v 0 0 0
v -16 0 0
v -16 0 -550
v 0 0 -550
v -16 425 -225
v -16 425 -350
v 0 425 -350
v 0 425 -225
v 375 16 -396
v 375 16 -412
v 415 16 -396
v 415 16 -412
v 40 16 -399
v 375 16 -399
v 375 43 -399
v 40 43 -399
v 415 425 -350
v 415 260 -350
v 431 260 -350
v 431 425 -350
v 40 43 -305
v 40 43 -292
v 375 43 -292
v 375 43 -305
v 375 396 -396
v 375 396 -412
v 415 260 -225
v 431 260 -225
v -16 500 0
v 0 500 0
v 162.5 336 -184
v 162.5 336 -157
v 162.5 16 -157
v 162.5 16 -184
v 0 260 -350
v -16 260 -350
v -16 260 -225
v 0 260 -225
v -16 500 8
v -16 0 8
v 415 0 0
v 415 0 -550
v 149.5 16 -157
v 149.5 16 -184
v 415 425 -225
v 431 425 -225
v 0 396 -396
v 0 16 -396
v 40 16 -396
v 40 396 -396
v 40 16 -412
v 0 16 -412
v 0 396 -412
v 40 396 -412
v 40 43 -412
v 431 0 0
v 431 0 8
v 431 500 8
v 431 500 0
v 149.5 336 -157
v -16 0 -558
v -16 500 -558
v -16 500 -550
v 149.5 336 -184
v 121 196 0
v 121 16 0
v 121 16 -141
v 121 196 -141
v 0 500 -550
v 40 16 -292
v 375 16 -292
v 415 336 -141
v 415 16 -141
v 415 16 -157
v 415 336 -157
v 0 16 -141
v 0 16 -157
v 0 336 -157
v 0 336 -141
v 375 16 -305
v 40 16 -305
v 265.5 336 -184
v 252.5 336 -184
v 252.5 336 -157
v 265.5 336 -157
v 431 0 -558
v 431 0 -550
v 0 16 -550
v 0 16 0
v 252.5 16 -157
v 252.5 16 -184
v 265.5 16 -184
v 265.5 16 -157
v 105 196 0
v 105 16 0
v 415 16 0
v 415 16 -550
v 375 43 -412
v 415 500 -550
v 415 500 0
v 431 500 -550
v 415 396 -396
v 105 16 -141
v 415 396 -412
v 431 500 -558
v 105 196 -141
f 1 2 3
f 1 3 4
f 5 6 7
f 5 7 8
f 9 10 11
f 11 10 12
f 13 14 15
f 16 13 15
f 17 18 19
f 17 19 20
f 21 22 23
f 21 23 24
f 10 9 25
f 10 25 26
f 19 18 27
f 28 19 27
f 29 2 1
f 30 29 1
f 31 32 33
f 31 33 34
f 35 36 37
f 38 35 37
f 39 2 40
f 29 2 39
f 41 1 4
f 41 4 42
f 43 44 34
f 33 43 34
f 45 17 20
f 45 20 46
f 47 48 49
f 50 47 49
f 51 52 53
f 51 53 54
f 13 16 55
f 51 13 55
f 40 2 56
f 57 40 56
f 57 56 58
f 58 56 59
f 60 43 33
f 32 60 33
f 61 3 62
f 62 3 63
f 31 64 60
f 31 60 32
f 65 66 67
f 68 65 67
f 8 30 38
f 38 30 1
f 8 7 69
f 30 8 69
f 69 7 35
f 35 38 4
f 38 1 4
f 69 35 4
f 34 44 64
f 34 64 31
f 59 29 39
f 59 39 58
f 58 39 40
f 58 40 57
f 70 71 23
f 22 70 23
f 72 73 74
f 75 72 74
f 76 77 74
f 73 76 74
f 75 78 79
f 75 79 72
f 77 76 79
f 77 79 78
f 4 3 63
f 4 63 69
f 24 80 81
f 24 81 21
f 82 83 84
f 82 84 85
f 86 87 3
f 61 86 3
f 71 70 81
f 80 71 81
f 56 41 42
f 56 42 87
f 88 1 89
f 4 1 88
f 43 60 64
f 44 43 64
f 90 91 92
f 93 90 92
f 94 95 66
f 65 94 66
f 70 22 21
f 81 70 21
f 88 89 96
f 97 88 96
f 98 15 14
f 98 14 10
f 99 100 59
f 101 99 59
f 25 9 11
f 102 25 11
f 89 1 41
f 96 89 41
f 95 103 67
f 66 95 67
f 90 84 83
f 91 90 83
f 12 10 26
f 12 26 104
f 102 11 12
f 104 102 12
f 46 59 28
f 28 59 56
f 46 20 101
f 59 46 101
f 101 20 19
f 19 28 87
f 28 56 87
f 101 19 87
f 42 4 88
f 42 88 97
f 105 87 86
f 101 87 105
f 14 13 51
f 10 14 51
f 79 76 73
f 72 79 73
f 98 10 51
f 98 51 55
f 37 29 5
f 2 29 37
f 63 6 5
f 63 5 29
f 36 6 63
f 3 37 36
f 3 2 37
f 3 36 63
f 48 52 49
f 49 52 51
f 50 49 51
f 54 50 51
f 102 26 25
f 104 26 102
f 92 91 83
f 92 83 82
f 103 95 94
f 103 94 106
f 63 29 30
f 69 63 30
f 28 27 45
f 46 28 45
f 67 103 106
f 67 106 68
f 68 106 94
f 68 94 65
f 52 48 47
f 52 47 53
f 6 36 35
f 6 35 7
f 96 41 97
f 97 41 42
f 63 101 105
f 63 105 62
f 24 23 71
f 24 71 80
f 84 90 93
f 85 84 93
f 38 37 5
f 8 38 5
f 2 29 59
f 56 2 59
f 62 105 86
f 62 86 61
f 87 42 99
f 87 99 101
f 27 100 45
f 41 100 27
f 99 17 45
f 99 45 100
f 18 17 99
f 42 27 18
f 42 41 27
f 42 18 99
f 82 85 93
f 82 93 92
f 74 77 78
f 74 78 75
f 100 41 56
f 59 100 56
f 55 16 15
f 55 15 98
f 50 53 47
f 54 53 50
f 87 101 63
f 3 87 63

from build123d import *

# Parameters (mm, degrees)
ESQUISSE1_W             = 415
ESQUISSE1_H             = 550
BOSS_EXTRU_1_DEPTH      = 16
BOSS_EXTRU_2_START      = 40
ESQUISSE2_W             = 13
ESQUISSE2_H             = 27
BOSS_EXTRU_2_DEPTH      = 335
BOSS_EXTRU_2_2_DEPTH    = 335
ESQUISSE3_W             = 16
ESQUISSE3_H             = 550
BOSS_EXTRU_3_DEPTH      = 500
BOSS_EXTRU_3_2_DEPTH    = 500
ESQUISSE4_W             = 125
ESQUISSE4_H             = 165
ENL_V_MAT_EXTRU_1_DEPTH = 868.357481088
ESQUISSE5_W             = 415
ESQUISSE5_H             = 16
BOSS_EXTRU_4_DEPTH      = 320
ESQUISSE6_W             = 447
ESQUISSE6_H             = 500
BOSS_EXTRU_5_DEPTH      = 8
ESQUISSE7_W             = 447
ESQUISSE7_H             = 500
BOSS_EXTRU_6_DEPTH      = 8
ESQUISSE9_W             = 40
ESQUISSE9_H             = 16
BOSS_EXTRU_8_DEPTH      = 380
BOSS_EXTRU_8_2_DEPTH    = 380
ESQUISSE10_W            = 16
ESQUISSE10_H            = 141
BOSS_EXTRU_9_DEPTH      = 180
ESQUISSE11_W            = 13
ESQUISSE11_H            = 27
BOSS_EXTRU_10_DEPTH     = 320
BOSS_EXTRU_10_2_DEPTH   = 320


with BuildPart() as part:
    # Esquisse1 → Boss.-Extru.1 (new body)
    with BuildSketch(Plane(origin=(0, 0, 0), x_dir=(1, 0, 0), z_dir=(0, 1, 0))):
        with Locations((207.5, 275)):
            Rectangle(ESQUISSE1_W, ESQUISSE1_H)
    extrude(amount=BOSS_EXTRU_1_DEPTH)


with BuildPart() as body_2:
    # Esquisse2 → Boss.-Extru.2 (new body)
    with BuildSketch(Plane(origin=(0, 0, -500), x_dir=(0, 0, -1), z_dir=(1, 0, 0)).offset(BOSS_EXTRU_2_START)):
        with Locations((-201.5, 29.5)):
            Rectangle(ESQUISSE2_W, ESQUISSE2_H)
    extrude(amount=BOSS_EXTRU_2_DEPTH)


with BuildPart() as body_3:
    # Esquisse2 → Boss.-Extru.2 2 (new body)
    with BuildSketch(Plane(origin=(0, 0, -500), x_dir=(0, 0, -1), z_dir=(1, 0, 0)).offset(BOSS_EXTRU_2_START)):
        with Locations((-94.5, 29.5)):
            Rectangle(ESQUISSE2_W, ESQUISSE2_H)
    extrude(amount=BOSS_EXTRU_2_2_DEPTH)


with BuildPart() as body_4:
    # Esquisse3 → Boss.-Extru.3 (new body)
    with BuildSketch(Plane(origin=(0, 0, 0), x_dir=(1, 0, 0), z_dir=(0, 1, 0))):
        with Locations((-8, 275)):
            Rectangle(ESQUISSE3_W, ESQUISSE3_H)
    extrude(amount=BOSS_EXTRU_3_DEPTH)


with BuildPart() as body_5:
    # Esquisse3 → Boss.-Extru.3 2 (new body)
    with BuildSketch(Plane(origin=(0, 0, 0), x_dir=(1, 0, 0), z_dir=(0, 1, 0))):
        with Locations((423, 275)):
            Rectangle(ESQUISSE3_W, ESQUISSE3_H)
    extrude(amount=BOSS_EXTRU_3_2_DEPTH)


with BuildPart() as enl_v_mat_extru_1_tool:
    # Esquisse4 → Enlèv. mat.-Extru.1 (new, through all)
    with BuildSketch(Plane.ZY.offset(16)):
        with Locations((-287.5, 342.5)):
            Rectangle(ESQUISSE4_W, ESQUISSE4_H)
    extrude(amount=-ENL_V_MAT_EXTRU_1_DEPTH)


with BuildPart() as body_4_1:
    add(body_4.part)

    # Enlèv. mat.-Extru.1: cut by enl_v_mat_extru_1_tool
    add(enl_v_mat_extru_1_tool.part, mode=Mode.SUBTRACT)


with BuildPart() as body_5_1:
    add(body_5.part)

    # Enlèv. mat.-Extru.1: cut by enl_v_mat_extru_1_tool
    add(enl_v_mat_extru_1_tool.part, mode=Mode.SUBTRACT)


with BuildPart() as body_6:
    # Esquisse5 → Boss.-Extru.4 (new body)
    with BuildSketch(Plane(origin=(0, 16, 0), x_dir=(1, 0, 0), z_dir=(0, 1, 0))):
        with Locations((207.5, 149)):
            Rectangle(ESQUISSE5_W, ESQUISSE5_H)
    extrude(amount=BOSS_EXTRU_4_DEPTH)


with BuildPart() as body_7:
    # Esquisse6 → Boss.-Extru.5 (new body)
    with BuildSketch(Plane(origin=(0, 0, -550), x_dir=(-1, 0, 0), z_dir=(0, 0, -1))):
        with Locations((-207.5, 250)):
            Rectangle(ESQUISSE6_W, ESQUISSE6_H)
    extrude(amount=BOSS_EXTRU_5_DEPTH)


with BuildPart() as body_8:
    # Esquisse7 → Boss.-Extru.6 (new body)
    with BuildSketch(Plane.XY):
        with Locations((207.5, 250)):
            Rectangle(ESQUISSE7_W, ESQUISSE7_H)
    extrude(amount=BOSS_EXTRU_6_DEPTH)


with BuildPart() as body_9:
    # Esquisse9 → Boss.-Extru.8 (new body)
    with BuildSketch(Plane(origin=(0, 16, 0), x_dir=(1, 0, 0), z_dir=(0, 1, 0))):
        with Locations((20, 404)):
            Rectangle(ESQUISSE9_W, ESQUISSE9_H)
    extrude(amount=BOSS_EXTRU_8_DEPTH)


with BuildPart() as body_10:
    # Esquisse9 → Boss.-Extru.8 2 (new body)
    with BuildSketch(Plane(origin=(0, 16, 0), x_dir=(1, 0, 0), z_dir=(0, 1, 0))):
        with Locations((395, 404)):
            Rectangle(ESQUISSE9_W, ESQUISSE9_H)
    extrude(amount=BOSS_EXTRU_8_2_DEPTH)


with BuildPart() as body_11:
    # Esquisse10 → Boss.-Extru.9 (new body)
    with BuildSketch(Plane(origin=(0, 16, 0), x_dir=(1, 0, 0), z_dir=(0, 1, 0))):
        with Locations((113, 70.5)):
            Rectangle(ESQUISSE10_W, ESQUISSE10_H)
    extrude(amount=BOSS_EXTRU_9_DEPTH)


with BuildPart() as body_12:
    # Esquisse11 → Boss.-Extru.10 (new body)
    with BuildSketch(Plane(origin=(0, 16, 0), x_dir=(1, 0, 0), z_dir=(0, 1, 0))):
        with Locations((156, 170.5)):
            Rectangle(ESQUISSE11_W, ESQUISSE11_H)
    extrude(amount=BOSS_EXTRU_10_DEPTH)


with BuildPart() as body_13:
    # Esquisse11 → Boss.-Extru.10 2 (new body)
    with BuildSketch(Plane(origin=(0, 16, 0), x_dir=(1, 0, 0), z_dir=(0, 1, 0))):
        with Locations((259, 170.5)):
            Rectangle(ESQUISSE11_W, ESQUISSE11_H)
    extrude(amount=BOSS_EXTRU_10_2_DEPTH)


solid = Compound([part.part, body_2.part, body_3.part, body_4_1.part, body_5_1.part, body_6.part, body_7.part, body_8.part, body_9.part, body_10.part, body_11.part, body_12.part, body_13.part])
